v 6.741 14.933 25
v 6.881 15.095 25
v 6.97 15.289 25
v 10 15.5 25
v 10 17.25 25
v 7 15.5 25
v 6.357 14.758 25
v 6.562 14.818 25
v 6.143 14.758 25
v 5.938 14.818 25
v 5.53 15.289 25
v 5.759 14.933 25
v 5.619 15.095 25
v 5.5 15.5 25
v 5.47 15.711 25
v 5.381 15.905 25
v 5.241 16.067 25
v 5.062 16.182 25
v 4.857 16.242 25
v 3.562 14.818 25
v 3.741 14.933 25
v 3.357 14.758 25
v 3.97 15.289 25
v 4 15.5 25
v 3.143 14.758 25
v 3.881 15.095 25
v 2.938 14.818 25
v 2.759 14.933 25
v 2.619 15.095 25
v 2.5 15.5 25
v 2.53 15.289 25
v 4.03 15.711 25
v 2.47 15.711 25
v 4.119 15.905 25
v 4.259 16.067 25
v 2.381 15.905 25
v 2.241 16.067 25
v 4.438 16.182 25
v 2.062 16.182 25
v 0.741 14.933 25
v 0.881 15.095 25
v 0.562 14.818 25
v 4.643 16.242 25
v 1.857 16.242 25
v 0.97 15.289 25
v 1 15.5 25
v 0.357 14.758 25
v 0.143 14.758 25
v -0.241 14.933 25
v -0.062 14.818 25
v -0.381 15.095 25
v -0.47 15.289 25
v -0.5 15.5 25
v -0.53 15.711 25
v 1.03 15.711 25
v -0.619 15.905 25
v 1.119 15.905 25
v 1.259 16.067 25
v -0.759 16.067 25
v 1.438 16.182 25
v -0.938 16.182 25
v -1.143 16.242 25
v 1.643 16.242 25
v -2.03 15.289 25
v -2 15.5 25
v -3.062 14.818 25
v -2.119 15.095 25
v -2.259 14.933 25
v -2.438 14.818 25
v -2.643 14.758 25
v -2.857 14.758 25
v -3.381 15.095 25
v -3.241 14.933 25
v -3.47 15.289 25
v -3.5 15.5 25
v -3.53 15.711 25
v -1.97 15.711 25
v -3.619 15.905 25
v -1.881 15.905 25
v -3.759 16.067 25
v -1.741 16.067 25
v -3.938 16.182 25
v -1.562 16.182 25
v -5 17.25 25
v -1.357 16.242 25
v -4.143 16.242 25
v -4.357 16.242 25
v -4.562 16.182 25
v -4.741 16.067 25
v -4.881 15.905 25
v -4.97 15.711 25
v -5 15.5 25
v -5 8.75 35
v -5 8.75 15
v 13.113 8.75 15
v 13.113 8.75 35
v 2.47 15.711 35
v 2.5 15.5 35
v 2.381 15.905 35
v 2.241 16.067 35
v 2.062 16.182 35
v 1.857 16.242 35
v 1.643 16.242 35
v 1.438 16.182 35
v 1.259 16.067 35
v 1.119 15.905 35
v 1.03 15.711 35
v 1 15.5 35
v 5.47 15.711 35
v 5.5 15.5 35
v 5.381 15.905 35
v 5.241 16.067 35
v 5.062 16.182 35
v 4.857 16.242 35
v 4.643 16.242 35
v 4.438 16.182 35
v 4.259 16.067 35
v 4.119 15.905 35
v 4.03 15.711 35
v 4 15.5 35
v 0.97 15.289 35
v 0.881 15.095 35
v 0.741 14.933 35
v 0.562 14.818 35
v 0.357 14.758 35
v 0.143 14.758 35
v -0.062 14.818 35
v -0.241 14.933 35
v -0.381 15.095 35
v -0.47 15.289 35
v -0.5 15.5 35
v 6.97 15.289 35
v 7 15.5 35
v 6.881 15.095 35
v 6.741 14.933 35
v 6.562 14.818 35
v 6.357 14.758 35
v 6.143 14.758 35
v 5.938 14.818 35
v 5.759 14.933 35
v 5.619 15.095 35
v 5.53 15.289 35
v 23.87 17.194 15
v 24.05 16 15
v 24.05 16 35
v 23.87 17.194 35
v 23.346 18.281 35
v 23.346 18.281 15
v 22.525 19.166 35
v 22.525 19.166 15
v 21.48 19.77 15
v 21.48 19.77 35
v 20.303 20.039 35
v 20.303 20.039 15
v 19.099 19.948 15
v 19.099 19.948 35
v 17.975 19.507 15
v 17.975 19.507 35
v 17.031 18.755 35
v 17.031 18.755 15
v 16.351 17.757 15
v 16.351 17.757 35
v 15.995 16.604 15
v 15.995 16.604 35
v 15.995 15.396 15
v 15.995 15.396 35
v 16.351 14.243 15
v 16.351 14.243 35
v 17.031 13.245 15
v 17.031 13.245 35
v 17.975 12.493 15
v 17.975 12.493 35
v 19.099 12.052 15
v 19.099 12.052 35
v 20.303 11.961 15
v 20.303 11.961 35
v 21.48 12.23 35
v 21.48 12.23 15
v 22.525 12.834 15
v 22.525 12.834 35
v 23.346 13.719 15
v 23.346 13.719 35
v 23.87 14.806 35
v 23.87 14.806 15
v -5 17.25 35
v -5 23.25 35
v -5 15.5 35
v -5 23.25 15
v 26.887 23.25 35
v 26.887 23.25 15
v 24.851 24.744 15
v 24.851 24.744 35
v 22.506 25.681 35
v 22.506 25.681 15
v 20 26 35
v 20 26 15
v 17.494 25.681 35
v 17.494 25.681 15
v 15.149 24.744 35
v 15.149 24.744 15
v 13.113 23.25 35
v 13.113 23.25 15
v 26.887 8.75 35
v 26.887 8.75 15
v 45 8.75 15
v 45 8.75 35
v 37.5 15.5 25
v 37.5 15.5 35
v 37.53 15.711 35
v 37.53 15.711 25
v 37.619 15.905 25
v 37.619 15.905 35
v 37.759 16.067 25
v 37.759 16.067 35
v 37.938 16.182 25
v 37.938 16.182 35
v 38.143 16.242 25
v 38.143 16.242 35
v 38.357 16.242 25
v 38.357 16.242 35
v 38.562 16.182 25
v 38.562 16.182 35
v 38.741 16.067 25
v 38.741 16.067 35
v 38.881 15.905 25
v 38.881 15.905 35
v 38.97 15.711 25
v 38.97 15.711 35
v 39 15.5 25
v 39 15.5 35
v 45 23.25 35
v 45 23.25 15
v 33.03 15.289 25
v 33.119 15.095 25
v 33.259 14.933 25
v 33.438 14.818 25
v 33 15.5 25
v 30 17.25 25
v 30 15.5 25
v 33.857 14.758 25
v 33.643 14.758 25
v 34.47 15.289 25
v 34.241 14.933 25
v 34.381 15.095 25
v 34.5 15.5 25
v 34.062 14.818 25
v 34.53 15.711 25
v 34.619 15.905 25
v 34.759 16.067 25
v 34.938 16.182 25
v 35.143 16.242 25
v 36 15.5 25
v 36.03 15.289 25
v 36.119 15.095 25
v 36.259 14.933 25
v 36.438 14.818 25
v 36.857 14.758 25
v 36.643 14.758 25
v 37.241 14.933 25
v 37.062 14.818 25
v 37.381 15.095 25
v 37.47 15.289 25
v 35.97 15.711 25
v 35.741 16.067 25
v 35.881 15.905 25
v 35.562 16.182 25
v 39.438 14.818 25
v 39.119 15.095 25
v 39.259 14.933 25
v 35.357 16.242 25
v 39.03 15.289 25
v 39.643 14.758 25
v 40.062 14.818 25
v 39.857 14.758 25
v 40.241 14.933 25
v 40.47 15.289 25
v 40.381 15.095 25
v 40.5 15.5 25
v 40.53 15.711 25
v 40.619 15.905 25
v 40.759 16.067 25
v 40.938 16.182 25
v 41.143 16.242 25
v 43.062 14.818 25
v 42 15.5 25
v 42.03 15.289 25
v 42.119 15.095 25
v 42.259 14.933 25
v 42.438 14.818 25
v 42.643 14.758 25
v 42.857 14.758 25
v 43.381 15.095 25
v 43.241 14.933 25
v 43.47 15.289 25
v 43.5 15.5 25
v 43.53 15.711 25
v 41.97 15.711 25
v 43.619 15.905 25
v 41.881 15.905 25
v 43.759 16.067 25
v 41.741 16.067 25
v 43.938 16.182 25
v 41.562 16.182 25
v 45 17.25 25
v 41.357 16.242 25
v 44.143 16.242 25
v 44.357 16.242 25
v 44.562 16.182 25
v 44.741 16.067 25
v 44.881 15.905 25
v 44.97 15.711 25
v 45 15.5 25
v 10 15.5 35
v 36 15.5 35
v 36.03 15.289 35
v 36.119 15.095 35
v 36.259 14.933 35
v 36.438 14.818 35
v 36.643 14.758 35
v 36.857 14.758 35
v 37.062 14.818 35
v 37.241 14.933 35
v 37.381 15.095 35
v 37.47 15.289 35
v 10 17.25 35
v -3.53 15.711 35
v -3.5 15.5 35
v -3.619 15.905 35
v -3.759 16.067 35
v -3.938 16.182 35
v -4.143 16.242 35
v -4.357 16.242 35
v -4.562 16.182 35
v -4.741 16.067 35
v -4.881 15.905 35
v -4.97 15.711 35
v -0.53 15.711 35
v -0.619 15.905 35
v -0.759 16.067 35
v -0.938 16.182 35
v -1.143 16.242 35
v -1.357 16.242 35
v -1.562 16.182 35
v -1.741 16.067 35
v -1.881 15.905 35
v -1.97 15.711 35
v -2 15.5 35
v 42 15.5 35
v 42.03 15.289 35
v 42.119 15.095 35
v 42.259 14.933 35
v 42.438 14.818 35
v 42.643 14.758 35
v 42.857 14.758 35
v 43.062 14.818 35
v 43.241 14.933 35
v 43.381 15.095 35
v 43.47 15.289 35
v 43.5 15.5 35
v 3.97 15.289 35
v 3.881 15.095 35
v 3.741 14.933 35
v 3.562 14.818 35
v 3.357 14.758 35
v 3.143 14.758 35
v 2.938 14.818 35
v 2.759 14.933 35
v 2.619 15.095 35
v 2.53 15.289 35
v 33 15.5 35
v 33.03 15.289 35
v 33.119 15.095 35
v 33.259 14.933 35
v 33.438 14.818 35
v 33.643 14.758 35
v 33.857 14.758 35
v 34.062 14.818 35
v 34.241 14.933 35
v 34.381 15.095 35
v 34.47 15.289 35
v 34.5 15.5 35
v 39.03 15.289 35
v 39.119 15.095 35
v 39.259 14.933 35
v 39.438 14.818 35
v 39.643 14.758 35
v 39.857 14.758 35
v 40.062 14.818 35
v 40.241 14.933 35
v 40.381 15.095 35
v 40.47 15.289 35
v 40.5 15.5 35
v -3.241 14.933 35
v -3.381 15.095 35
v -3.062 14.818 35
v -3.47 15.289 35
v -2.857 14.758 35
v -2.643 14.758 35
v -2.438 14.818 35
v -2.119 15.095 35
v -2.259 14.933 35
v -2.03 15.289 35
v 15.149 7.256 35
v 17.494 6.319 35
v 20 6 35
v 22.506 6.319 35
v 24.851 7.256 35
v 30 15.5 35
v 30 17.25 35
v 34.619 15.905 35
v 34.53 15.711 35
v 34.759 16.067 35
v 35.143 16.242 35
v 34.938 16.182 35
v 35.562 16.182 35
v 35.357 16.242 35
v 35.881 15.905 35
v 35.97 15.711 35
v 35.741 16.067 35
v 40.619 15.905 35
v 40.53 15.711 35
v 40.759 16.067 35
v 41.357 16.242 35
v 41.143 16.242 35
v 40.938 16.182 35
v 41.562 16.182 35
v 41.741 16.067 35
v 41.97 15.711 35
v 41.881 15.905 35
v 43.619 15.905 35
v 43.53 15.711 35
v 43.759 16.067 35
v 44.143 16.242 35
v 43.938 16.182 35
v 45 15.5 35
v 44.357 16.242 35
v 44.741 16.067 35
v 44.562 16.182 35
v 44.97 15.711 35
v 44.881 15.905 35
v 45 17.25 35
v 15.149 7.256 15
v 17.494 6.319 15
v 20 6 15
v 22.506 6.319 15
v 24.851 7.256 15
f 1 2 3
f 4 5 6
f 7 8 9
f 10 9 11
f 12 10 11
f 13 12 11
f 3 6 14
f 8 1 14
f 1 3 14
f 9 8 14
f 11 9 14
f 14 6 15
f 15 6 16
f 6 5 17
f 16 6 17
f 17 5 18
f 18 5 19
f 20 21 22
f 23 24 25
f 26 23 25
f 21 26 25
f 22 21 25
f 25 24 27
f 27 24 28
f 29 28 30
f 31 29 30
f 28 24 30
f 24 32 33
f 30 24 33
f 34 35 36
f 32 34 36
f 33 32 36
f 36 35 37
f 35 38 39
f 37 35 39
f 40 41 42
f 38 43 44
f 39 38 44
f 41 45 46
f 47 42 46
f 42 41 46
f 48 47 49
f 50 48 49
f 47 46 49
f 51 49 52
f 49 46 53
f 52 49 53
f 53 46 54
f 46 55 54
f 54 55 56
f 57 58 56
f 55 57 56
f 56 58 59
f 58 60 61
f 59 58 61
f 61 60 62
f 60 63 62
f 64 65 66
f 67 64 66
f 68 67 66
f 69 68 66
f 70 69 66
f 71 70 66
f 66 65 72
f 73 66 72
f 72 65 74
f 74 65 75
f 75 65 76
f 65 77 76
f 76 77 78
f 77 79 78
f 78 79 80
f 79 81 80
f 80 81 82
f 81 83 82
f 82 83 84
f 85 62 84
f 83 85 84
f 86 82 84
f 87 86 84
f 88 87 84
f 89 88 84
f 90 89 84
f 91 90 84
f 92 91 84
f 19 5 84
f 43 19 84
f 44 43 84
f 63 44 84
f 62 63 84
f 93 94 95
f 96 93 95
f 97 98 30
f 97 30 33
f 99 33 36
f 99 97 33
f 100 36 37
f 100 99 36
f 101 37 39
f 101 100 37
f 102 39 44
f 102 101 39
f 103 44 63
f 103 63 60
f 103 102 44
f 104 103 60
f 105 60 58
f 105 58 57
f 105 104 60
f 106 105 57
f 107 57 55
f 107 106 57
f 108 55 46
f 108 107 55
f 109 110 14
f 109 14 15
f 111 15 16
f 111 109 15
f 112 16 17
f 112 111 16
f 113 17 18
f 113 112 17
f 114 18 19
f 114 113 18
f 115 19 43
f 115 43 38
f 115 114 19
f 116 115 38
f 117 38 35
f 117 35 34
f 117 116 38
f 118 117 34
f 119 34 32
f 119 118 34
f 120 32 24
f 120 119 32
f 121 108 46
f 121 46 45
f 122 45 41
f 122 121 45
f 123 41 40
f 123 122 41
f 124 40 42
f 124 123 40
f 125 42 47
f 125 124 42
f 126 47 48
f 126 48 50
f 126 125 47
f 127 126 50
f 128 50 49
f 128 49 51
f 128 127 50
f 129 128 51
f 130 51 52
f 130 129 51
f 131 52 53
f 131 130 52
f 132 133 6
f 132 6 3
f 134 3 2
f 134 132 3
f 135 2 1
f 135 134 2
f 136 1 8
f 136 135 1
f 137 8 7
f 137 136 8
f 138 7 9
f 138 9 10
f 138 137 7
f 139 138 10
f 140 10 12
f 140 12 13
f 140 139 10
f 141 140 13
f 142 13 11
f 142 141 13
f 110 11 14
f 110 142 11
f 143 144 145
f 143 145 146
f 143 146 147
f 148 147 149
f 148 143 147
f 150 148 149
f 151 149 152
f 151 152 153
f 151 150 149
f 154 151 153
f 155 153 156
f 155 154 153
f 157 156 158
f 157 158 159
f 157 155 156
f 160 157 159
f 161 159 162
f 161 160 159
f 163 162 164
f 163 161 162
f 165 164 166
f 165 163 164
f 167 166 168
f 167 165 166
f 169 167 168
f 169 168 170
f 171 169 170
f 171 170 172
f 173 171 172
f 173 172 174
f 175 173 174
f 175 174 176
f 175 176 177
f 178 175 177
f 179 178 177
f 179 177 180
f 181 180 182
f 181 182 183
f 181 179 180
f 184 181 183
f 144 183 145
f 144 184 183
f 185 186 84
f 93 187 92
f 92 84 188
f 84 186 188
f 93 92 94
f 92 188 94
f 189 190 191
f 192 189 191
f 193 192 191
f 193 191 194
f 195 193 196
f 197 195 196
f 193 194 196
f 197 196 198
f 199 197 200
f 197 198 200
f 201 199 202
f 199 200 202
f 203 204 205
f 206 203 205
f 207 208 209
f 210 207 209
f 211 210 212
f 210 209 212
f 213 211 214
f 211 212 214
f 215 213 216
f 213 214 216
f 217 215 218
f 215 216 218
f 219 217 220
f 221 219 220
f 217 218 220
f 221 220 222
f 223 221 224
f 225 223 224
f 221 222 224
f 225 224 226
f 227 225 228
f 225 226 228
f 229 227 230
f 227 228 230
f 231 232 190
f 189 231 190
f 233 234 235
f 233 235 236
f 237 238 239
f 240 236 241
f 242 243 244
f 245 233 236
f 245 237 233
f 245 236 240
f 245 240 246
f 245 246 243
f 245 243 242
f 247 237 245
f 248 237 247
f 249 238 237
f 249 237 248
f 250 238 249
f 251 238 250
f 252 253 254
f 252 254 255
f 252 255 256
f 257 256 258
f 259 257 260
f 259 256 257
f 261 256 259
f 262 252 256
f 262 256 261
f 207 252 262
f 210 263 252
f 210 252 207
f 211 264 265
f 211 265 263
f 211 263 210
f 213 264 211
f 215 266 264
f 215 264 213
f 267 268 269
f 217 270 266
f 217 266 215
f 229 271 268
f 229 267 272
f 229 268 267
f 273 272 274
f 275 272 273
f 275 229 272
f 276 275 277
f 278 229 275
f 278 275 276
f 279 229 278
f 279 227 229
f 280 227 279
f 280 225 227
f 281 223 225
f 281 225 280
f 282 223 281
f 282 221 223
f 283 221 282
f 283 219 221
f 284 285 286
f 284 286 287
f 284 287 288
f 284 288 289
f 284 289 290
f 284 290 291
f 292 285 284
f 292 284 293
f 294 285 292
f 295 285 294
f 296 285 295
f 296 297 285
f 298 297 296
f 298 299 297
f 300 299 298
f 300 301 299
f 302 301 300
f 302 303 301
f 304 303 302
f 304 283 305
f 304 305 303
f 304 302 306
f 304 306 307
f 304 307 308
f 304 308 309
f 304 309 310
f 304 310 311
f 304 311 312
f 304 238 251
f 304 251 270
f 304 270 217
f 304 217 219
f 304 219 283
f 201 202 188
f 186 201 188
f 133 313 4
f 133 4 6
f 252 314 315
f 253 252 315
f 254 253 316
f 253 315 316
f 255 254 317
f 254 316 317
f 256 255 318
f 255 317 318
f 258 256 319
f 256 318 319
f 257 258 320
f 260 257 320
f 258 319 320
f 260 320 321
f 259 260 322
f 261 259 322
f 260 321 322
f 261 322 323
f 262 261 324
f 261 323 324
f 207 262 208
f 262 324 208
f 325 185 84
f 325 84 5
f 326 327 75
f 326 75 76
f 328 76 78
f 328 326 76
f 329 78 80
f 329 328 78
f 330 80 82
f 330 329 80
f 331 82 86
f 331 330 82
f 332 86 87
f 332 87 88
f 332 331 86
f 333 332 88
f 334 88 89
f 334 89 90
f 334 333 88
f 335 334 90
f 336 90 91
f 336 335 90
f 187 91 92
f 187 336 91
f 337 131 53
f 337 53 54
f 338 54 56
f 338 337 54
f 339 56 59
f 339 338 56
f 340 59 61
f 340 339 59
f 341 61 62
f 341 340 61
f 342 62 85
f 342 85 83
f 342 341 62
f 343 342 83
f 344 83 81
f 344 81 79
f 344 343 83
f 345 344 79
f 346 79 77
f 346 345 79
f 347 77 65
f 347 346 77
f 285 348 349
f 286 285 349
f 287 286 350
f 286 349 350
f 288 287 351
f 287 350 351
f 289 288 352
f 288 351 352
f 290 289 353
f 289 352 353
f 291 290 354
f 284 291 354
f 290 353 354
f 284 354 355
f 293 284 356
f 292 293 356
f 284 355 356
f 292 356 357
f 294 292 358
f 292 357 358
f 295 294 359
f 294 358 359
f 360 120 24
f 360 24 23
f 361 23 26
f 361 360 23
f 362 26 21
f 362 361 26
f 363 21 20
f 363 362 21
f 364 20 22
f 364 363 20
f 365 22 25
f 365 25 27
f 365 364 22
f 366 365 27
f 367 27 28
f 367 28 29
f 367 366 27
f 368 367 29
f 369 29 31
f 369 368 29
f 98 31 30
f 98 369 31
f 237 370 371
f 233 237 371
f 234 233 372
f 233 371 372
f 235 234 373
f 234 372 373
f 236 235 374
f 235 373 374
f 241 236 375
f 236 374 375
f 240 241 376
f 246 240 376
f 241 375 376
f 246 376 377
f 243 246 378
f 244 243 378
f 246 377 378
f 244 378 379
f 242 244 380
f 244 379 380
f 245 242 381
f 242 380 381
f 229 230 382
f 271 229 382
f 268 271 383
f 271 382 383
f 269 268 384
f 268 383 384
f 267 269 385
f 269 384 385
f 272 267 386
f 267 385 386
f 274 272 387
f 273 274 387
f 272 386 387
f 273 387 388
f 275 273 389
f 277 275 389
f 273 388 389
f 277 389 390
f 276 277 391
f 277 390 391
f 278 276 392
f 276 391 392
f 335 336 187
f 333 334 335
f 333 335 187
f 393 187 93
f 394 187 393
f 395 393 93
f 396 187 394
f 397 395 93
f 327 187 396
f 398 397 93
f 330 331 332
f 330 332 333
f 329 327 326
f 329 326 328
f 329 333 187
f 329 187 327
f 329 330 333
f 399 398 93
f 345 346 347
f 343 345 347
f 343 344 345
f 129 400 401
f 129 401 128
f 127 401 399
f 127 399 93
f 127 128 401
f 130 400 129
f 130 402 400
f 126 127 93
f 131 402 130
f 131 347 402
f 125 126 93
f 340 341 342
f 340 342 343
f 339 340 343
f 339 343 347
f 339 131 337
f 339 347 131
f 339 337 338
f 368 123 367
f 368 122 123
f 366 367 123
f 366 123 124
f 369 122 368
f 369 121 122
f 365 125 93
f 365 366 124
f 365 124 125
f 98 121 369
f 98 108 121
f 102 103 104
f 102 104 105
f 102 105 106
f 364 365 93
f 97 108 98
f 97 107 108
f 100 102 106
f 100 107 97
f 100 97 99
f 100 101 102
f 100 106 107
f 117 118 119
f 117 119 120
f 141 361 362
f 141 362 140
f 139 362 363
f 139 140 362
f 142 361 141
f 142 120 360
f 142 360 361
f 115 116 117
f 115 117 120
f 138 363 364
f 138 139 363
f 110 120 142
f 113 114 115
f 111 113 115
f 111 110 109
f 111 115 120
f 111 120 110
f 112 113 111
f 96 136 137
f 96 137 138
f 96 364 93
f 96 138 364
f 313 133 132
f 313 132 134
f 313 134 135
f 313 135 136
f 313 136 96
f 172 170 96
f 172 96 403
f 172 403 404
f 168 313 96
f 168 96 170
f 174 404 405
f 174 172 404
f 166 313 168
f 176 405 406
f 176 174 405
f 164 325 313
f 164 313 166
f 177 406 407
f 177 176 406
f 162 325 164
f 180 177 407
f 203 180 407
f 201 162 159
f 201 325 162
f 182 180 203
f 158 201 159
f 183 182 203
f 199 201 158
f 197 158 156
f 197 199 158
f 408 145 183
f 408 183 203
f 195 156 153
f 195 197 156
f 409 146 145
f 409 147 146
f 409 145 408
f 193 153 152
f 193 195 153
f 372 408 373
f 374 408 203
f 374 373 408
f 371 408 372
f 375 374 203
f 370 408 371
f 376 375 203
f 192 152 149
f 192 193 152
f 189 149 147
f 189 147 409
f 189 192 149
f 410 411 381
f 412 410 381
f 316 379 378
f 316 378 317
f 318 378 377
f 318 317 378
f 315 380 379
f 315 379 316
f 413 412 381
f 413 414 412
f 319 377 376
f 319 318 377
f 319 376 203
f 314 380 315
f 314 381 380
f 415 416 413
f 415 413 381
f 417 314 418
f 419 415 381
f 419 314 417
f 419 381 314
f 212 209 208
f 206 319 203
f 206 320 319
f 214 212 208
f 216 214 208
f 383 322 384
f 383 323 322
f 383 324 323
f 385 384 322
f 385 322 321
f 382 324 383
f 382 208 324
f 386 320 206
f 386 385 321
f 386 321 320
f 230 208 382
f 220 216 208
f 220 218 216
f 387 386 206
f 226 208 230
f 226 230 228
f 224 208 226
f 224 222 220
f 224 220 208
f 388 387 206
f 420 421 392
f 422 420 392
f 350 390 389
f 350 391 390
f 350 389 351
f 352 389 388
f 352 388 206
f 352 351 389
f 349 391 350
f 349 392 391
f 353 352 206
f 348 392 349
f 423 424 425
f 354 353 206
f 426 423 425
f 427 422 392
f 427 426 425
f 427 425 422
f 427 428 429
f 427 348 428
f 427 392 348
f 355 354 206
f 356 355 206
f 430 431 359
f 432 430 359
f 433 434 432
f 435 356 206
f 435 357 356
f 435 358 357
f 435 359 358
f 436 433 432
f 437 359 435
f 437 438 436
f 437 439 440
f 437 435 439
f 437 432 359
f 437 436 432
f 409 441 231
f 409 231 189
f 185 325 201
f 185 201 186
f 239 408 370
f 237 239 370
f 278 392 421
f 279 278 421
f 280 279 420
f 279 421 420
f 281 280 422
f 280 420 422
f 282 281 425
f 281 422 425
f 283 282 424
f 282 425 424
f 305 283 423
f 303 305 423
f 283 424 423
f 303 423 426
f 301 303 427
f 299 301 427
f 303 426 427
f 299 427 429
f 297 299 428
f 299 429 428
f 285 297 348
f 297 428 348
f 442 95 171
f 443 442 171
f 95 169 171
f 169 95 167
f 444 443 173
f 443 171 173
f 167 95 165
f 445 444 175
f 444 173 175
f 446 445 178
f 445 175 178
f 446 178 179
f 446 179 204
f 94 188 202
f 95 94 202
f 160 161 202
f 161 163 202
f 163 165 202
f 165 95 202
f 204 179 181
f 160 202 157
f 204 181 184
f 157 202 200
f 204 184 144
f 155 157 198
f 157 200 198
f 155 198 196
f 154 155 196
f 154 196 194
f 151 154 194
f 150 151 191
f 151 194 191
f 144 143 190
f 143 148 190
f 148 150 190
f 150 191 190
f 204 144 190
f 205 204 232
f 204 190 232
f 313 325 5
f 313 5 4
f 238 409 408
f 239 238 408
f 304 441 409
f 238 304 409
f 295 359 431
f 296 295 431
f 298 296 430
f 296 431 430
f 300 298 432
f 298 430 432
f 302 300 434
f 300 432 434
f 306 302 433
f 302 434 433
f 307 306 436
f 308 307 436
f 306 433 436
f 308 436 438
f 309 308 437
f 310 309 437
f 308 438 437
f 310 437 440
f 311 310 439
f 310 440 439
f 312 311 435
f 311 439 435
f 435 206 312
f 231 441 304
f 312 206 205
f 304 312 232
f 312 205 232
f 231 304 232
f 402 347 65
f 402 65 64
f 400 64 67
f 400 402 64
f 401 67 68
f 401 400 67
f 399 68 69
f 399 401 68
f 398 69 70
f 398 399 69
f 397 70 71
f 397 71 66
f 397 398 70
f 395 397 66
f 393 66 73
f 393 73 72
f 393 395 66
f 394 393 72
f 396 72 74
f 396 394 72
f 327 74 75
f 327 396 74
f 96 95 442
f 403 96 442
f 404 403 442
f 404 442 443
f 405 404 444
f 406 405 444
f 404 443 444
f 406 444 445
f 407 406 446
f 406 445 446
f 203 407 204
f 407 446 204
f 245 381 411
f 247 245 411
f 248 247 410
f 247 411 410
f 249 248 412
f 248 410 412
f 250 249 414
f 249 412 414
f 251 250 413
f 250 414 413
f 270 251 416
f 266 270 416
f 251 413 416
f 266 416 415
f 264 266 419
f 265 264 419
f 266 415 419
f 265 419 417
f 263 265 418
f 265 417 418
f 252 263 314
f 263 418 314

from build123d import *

# Parameters (mm, degrees)
EXTRUDE_1_DEPTH     = 20
OTHER_START         = 15
OTHER_1_OUTLINE_R   = 4.05
OTHER_1_DEPTH       = 20
CUT_EXTRUDE_1_DEPTH = 10


# Read off the part's stored shape, not the designer's step: 高级异型孔1
with BuildPart() as part:
    # 草图3 → 凸台-拉伸1 (new body)
    with BuildSketch(Plane.XY.offset(15)):
        with BuildLine():
            Line((26.887488657, 8.75), (45, 8.75))
            Line((45, 8.75), (45, 23.25))
            Line((45, 23.25), (26.887488657, 23.25))
            ThreePointArc((26.887488657, 23.25), (20, 26), (13.112511343, 23.25))
            Line((13.112511343, 23.25), (-5, 23.25))
            Line((-5, 23.25), (-5, 8.75))
            Line((-5, 8.75), (13.112511343, 8.75))
            ThreePointArc((13.112511343, 8.75), (20, 6), (26.887488657, 8.75))
        make_face()
    extrude(amount=EXTRUDE_1_DEPTH)

    # 高级异型孔1 outline → 高级异型孔1 (cut)
    with BuildSketch(Plane.XY.offset(OTHER_START)):
        with Locations((20, 16)):
            Circle(OTHER_1_OUTLINE_R)
    extrude(amount=OTHER_1_DEPTH, mode=Mode.SUBTRACT)

    # 草图6 → 切除-拉伸1 (cut)
    with BuildSketch(Plane.XY.offset(35)):
        with BuildLine():
            Line((-5, 15.5), (-5, 17.25))
            Line((-5, 17.25), (10, 17.25))
            Line((10, 17.25), (10, 15.5))
            Line((10, 15.5), (7, 15.5))
            ThreePointArc((7, 15.5), (6.25, 14.75), (5.5, 15.5))
            ThreePointArc((5.5, 15.5), (4.75, 16.25), (4, 15.5))
            ThreePointArc((4, 15.5), (3.25, 14.75), (2.5, 15.5))
            ThreePointArc((2.5, 15.5), (1.75, 16.25), (1, 15.5))
            ThreePointArc((1, 15.5), (0.25, 14.75), (-0.5, 15.5))
            ThreePointArc((-0.5, 15.5), (-1.25, 16.25), (-2, 15.5))
            ThreePointArc((-2, 15.5), (-2.75, 14.75), (-3.5, 15.5))
            ThreePointArc((-3.5, 15.5), (-4.25, 16.25), (-5, 15.5))
        make_face()
        with BuildLine():
            Line((45, 17.25), (30, 17.25))
            Line((30, 17.25), (30, 15.5))
            Line((30, 15.5), (33, 15.5))
            ThreePointArc((33, 15.5), (33.75, 14.75), (34.5, 15.5))
            ThreePointArc((34.5, 15.5), (35.25, 16.25), (36, 15.5))
            ThreePointArc((36, 15.5), (36.75, 14.75), (37.5, 15.5))
            ThreePointArc((37.5, 15.5), (38.25, 16.25), (39, 15.5))
            ThreePointArc((39, 15.5), (39.75, 14.75), (40.5, 15.5))
            ThreePointArc((40.5, 15.5), (41.25, 16.25), (42, 15.5))
            ThreePointArc((42, 15.5), (42.75, 14.75), (43.5, 15.5))
            ThreePointArc((43.5, 15.5), (44.25, 16.25), (45, 15.5))
            Line((45, 15.5), (45, 17.25))
        make_face()
    extrude(amount=-CUT_EXTRUDE_1_DEPTH, mode=Mode.SUBTRACT)


solid = part.part
